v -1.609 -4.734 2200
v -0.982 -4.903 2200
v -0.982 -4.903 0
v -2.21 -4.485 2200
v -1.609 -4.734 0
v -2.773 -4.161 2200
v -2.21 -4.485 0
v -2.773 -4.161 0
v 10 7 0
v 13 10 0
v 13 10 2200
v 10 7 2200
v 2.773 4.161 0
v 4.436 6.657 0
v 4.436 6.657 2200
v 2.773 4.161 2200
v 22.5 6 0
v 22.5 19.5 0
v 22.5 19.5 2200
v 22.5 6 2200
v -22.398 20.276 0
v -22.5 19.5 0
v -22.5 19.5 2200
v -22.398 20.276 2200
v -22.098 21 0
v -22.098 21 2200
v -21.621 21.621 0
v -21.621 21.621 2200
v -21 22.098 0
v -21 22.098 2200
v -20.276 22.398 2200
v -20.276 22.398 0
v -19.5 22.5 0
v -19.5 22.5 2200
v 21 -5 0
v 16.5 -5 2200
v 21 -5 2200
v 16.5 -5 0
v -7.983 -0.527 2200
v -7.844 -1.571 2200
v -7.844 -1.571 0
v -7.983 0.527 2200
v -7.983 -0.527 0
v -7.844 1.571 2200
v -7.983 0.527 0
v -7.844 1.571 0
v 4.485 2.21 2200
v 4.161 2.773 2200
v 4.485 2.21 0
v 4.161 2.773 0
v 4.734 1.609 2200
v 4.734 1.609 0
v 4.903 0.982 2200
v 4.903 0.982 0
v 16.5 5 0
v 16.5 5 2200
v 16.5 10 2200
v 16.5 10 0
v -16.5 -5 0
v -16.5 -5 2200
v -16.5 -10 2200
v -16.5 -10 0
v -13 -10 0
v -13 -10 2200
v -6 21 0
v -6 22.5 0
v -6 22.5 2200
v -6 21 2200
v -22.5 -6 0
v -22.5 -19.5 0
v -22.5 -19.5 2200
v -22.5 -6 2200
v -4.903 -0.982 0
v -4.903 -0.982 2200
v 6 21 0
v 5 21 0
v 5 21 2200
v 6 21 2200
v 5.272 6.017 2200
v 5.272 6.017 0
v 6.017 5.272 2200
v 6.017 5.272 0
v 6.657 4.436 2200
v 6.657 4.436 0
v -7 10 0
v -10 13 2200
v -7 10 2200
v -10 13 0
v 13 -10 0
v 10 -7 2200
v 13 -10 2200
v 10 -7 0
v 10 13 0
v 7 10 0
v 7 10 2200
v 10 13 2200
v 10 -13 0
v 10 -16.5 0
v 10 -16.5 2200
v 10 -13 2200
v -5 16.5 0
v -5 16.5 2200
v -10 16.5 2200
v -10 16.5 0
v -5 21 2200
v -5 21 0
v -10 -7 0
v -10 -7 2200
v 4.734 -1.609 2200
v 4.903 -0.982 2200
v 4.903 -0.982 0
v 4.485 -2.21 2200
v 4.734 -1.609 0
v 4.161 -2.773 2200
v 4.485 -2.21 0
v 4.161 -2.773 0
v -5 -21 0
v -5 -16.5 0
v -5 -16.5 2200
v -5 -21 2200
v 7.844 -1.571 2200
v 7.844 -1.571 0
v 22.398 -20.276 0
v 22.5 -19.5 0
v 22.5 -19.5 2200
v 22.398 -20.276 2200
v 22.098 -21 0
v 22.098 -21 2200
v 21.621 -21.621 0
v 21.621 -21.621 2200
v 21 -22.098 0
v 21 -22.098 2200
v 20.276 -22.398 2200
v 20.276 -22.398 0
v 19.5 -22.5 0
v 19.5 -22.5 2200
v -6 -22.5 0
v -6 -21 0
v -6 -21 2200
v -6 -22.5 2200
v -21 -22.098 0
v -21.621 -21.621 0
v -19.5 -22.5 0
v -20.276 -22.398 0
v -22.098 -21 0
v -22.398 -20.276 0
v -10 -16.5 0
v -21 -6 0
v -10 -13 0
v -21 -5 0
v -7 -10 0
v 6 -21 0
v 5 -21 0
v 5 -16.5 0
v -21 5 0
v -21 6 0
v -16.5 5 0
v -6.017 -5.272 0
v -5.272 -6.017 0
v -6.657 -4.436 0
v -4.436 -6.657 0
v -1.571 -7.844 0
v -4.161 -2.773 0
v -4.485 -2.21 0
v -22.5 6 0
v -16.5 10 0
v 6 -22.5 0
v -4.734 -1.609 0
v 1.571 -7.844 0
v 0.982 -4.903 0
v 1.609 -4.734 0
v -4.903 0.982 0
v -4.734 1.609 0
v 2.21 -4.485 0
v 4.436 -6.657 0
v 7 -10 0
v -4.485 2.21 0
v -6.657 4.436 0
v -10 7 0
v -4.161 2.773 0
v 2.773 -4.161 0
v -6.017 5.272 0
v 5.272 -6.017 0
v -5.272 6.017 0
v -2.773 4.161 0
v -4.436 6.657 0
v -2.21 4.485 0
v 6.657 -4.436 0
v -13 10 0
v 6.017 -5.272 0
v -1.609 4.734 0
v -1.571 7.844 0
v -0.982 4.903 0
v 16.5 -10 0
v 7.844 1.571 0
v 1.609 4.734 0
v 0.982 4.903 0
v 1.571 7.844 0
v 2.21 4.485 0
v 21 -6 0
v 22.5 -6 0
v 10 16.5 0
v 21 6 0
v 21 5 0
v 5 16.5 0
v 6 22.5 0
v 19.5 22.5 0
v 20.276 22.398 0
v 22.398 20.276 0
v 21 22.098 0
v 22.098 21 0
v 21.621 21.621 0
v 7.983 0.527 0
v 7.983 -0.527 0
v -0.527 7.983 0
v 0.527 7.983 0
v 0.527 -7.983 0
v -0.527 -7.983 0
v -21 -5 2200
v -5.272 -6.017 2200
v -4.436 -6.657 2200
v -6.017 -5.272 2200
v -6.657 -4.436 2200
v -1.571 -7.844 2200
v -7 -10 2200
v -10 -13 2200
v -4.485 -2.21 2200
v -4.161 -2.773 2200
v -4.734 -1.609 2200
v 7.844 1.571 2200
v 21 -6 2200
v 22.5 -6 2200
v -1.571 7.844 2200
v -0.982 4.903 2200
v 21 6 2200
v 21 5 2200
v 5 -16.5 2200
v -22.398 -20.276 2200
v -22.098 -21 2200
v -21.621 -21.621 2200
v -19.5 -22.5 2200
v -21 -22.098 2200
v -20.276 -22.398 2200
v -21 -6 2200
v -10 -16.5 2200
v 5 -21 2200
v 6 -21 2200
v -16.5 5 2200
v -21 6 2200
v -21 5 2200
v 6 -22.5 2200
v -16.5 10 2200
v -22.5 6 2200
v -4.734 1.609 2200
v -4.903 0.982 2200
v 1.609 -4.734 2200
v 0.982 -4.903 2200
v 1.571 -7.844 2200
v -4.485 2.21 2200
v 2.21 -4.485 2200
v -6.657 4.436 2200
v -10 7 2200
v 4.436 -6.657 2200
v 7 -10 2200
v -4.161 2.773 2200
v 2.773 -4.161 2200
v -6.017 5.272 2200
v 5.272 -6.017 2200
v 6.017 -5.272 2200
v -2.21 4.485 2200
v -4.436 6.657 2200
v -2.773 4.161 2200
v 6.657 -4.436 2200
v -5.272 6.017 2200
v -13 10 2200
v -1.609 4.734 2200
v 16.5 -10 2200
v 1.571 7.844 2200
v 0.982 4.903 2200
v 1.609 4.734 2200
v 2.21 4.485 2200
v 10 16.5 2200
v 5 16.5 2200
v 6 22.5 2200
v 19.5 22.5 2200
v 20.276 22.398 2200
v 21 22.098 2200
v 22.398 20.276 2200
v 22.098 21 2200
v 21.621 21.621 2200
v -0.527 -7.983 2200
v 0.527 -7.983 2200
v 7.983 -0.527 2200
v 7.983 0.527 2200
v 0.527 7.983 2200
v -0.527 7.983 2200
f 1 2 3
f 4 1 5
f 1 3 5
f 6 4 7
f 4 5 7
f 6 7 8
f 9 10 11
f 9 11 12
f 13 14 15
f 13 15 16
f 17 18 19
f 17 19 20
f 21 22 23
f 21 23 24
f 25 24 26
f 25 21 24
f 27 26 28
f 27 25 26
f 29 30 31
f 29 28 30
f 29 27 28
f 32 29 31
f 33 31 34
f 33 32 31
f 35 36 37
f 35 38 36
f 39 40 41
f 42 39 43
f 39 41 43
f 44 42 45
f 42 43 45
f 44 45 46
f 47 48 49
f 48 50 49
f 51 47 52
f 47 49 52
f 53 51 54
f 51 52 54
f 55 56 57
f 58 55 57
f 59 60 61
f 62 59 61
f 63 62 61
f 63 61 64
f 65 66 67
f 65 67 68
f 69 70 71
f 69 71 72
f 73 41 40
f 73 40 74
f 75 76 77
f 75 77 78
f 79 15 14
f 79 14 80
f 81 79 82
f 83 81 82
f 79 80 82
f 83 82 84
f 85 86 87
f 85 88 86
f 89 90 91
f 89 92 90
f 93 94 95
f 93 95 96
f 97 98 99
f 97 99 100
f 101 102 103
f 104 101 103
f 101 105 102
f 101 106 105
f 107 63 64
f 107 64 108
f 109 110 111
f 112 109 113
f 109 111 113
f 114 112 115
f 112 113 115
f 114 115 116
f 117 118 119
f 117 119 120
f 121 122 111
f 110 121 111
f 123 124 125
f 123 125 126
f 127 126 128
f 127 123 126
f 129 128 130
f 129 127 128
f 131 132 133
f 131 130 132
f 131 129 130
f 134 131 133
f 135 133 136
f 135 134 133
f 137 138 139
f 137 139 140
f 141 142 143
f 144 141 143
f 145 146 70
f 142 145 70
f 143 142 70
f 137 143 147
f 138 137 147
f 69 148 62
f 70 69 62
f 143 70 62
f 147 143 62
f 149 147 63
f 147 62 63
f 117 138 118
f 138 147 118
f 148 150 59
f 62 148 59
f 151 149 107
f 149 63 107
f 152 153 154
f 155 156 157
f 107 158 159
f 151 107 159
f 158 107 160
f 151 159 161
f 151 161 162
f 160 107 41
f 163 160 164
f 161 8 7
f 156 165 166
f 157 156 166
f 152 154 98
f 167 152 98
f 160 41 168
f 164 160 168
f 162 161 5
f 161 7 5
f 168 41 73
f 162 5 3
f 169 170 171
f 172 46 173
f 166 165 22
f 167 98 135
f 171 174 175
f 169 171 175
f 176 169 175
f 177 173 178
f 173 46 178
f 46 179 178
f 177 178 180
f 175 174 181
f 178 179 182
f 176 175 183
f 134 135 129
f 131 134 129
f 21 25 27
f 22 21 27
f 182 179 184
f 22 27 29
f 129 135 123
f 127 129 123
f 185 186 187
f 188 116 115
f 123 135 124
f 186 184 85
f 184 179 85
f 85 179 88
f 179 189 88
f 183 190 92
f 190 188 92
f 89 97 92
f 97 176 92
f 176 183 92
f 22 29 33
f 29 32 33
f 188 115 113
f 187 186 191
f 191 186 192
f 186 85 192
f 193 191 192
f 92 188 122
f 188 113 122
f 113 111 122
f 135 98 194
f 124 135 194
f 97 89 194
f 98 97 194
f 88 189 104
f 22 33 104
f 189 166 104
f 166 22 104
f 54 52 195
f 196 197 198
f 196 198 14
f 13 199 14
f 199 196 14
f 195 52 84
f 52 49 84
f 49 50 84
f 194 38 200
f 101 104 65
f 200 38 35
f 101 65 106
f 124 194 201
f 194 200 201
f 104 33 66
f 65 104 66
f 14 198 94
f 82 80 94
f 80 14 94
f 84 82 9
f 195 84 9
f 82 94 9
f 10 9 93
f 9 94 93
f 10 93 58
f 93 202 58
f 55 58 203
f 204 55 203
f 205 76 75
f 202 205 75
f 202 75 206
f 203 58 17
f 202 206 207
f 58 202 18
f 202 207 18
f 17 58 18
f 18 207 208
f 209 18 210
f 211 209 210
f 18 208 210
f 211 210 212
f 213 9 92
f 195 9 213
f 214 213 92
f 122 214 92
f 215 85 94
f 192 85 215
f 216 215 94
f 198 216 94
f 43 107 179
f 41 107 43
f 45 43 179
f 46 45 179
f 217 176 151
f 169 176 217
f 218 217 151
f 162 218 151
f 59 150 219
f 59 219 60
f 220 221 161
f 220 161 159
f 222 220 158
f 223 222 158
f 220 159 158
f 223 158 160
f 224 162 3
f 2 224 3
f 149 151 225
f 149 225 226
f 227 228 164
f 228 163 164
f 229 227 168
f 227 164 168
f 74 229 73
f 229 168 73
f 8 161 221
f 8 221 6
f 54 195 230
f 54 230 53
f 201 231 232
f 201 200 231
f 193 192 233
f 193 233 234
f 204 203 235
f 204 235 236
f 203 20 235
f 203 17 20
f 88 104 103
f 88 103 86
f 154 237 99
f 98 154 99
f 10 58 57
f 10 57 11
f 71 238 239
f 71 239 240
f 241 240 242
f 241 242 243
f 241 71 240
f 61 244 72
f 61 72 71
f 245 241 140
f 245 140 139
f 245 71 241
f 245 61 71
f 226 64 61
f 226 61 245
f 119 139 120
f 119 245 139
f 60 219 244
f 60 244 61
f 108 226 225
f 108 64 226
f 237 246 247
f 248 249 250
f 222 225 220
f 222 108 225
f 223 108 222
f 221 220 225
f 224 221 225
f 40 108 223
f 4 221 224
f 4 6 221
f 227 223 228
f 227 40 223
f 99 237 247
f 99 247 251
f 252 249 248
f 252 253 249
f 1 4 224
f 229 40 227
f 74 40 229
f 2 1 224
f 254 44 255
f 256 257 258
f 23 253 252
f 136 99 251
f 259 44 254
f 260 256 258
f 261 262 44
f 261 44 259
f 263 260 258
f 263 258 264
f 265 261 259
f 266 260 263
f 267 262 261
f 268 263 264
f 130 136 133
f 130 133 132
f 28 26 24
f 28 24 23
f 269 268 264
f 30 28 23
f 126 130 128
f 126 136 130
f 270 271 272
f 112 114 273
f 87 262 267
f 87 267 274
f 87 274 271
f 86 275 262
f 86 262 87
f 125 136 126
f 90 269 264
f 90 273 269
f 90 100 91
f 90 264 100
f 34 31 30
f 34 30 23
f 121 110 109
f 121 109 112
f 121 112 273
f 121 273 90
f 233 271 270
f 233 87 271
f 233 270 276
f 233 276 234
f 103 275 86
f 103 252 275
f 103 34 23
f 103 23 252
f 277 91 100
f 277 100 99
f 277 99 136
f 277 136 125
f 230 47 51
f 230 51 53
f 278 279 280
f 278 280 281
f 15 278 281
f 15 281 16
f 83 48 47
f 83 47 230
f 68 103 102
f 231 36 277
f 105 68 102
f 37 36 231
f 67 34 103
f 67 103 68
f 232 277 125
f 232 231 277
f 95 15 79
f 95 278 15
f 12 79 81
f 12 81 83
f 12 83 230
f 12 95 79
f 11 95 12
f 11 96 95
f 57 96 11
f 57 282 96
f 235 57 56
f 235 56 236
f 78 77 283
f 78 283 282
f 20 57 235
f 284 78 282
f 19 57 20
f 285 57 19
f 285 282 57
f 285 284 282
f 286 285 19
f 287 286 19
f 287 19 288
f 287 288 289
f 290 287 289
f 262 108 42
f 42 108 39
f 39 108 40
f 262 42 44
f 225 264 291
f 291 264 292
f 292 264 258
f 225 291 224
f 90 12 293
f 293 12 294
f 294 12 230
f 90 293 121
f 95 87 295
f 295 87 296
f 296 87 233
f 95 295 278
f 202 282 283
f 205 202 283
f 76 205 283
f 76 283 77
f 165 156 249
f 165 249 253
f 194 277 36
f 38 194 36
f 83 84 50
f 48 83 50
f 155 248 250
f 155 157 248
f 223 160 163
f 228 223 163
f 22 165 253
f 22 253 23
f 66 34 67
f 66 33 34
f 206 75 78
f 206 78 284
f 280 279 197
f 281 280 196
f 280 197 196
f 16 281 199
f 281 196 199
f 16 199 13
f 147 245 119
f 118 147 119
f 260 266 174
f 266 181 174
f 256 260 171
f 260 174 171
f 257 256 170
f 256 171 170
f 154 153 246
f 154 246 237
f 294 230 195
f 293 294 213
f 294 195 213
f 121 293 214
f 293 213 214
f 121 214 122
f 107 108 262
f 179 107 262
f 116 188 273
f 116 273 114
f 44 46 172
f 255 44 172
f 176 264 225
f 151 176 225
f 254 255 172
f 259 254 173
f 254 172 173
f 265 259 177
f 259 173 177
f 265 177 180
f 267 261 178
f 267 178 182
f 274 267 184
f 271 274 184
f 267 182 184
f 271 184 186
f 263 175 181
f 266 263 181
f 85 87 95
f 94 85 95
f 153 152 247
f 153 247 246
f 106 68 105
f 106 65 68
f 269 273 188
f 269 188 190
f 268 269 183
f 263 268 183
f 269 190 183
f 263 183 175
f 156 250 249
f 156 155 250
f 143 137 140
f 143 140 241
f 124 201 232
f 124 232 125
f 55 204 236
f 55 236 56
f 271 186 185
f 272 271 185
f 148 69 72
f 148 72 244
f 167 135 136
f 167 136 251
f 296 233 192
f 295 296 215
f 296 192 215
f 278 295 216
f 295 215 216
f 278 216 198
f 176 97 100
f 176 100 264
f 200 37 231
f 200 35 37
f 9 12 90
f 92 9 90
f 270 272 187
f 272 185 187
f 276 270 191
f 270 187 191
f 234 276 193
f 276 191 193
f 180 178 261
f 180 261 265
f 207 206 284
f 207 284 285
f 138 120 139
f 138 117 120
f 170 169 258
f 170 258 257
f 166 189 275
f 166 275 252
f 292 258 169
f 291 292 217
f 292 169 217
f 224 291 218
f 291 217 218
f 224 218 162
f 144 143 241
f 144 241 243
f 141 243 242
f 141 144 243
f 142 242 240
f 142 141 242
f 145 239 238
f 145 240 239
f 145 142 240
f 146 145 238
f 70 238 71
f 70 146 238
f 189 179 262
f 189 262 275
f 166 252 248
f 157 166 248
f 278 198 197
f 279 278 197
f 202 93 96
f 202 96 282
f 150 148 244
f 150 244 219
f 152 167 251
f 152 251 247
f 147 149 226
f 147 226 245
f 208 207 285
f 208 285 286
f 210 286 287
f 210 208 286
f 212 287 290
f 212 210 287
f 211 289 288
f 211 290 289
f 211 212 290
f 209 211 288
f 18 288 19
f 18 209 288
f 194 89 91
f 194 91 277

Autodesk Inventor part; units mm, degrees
ref_plane "YZ Plane" through (0, 0, 0) normal (1, 0, 0) x (0, 1, 0)
ref_plane "XZ Plane" through (0, 0, 0) normal (0, 1, 0) x (-1, 0, 0)
ref_plane "XY Plane" through (0, 0, 0) normal (0, 0, 1) x (1, 0, 0)
sketch "Skizze1" plane through (0, 0, 0) normal (0, 0, 1) x (1, 0, 0)
  line L0 (-19.5, 22.5) -> (19.5, 22.5)
  line L1 (22.5, 19.5) -> (22.5, -19.5)
  line L2 (19.5, -22.5) -> (-19.5, -22.5)
  line L3 (-22.5, -19.5) -> (-22.5, 19.5)
  circle A0 centre (0, 0) radius 5
  line L4 (-32.3698, 0) -> (32.3698, 0) projected
  line L5 (0, -32.3698) -> (0, 32.3698) projected
  arc A1 (22.5, 19.5) -> (19.5, 22.5) centre (19.5, 19.5) ccw
  arc A2 (-19.5, 22.5) -> (-22.5, 19.5) centre (-19.5, 19.5) ccw
  arc A3 (-22.5, -19.5) -> (-19.5, -22.5) centre (-19.5, -19.5) ccw
  arc A4 (19.5, -22.5) -> (22.5, -19.5) centre (19.5, -19.5) ccw
  point P0 (-22.5, 22.5)
  point P1 (22.5, 22.5)
  point P2 (-22.5, -22.5)
  dimension "d0" = 45
  dimension "d1" = 45
  dimension "d2" = 10
  dimension "d3" = 3
extrude "Extrusion1" add sketch "Skizze1" along normal blind 2200 contours L0 L5 A0 L4 L3 A2 | L0 A1 L1 L4 A0 L5 | L4 A0 L5 L2 A3 L3 | L4 L1 A4 L2 L5 A0
sketch "Skizze2" plane through (0, 0, 0) normal (0, 0, -1) x (-1, 0, 0)
  line L0 (19.5, -22.5) -> (-19.5, -22.5) projected
  line L1 (31.5, 0) -> (-31.5, 0) projected
  line L2 (0, -31.5) -> (0, 31.5) projected
  line L3 (-6, -22.5) -> (-6, -21)
  line L4 (-6, -21) -> (-5, -21)
  line L5 (-5, -21) -> (-5, -16.5)
  line L6 (-5, -16.5) -> (-10, -16.5)
  line L7 (-10, -16.5) -> (-10, -13)
  line L8 (-10, -13) -> (-7, -10)
  line L9 (-7, -10) -> (7, -10)
  line L10 (7, -10) -> (10, -13)
  line L11 (10, -13) -> (10, -16.5)
  line L12 (10, -16.5) -> (5, -16.5)
  line L13 (5, -16.5) -> (5, -21)
  line L14 (5, -21) -> (6, -21)
  line L15 (6, -21) -> (6, -22.5)
  dimension "d6" = 10
  dimension "d7" = 20
  dimension "d8" = 12
  dimension "d9" = 1.5
  dimension "d10" = 12.5
  dimension "d11" = 135
  dimension "d12" = 6
  dimension "d13" = 3.5
extrude "Extrusion2" cut sketch "Skizze2" against normal through all
pattern_circular "Runde Anordnung1" count 4 over 360 about axis through (0, 0, 0) along (0, 0, 1) of "Extrusion2"
sketch "Skizze3" plane through (0, 0, 0) normal (0, 0, -1) x (-1, 0, 0)
  circle A0 centre (0, 0) radius 5 projected
  line L0 (31.5, 0) -> (-31.5, 0) projected
  line L1 (0, -31.5) -> (0, 31.5) projected
  line L2 (-1.5708, 7.8443) -> (-0.9817, 4.9027)
  line L3 (1.5708, 7.8443) -> (0.9817, 4.9027)
  arc A1 (1.5708, 7.8443) -> (-1.5708, 7.8443) centre (0, 0) ccw
  dimension "d20" = 1.9635
  dimension "d21" = 3.1416
  dimension "d22" = 8
extrude "Extrusion3" cut sketch "Skizze3" against normal through all contours A0 L1 A1 L3 | A0 L2 A1 L1
pattern_circular "Runde Anordnung2" count 8 over 360 about axis through (0, 0, 0) along (0, 0, 1) of "Extrusion3"
properties part number "Alu-Profil Nut 10 45x45 2150"
